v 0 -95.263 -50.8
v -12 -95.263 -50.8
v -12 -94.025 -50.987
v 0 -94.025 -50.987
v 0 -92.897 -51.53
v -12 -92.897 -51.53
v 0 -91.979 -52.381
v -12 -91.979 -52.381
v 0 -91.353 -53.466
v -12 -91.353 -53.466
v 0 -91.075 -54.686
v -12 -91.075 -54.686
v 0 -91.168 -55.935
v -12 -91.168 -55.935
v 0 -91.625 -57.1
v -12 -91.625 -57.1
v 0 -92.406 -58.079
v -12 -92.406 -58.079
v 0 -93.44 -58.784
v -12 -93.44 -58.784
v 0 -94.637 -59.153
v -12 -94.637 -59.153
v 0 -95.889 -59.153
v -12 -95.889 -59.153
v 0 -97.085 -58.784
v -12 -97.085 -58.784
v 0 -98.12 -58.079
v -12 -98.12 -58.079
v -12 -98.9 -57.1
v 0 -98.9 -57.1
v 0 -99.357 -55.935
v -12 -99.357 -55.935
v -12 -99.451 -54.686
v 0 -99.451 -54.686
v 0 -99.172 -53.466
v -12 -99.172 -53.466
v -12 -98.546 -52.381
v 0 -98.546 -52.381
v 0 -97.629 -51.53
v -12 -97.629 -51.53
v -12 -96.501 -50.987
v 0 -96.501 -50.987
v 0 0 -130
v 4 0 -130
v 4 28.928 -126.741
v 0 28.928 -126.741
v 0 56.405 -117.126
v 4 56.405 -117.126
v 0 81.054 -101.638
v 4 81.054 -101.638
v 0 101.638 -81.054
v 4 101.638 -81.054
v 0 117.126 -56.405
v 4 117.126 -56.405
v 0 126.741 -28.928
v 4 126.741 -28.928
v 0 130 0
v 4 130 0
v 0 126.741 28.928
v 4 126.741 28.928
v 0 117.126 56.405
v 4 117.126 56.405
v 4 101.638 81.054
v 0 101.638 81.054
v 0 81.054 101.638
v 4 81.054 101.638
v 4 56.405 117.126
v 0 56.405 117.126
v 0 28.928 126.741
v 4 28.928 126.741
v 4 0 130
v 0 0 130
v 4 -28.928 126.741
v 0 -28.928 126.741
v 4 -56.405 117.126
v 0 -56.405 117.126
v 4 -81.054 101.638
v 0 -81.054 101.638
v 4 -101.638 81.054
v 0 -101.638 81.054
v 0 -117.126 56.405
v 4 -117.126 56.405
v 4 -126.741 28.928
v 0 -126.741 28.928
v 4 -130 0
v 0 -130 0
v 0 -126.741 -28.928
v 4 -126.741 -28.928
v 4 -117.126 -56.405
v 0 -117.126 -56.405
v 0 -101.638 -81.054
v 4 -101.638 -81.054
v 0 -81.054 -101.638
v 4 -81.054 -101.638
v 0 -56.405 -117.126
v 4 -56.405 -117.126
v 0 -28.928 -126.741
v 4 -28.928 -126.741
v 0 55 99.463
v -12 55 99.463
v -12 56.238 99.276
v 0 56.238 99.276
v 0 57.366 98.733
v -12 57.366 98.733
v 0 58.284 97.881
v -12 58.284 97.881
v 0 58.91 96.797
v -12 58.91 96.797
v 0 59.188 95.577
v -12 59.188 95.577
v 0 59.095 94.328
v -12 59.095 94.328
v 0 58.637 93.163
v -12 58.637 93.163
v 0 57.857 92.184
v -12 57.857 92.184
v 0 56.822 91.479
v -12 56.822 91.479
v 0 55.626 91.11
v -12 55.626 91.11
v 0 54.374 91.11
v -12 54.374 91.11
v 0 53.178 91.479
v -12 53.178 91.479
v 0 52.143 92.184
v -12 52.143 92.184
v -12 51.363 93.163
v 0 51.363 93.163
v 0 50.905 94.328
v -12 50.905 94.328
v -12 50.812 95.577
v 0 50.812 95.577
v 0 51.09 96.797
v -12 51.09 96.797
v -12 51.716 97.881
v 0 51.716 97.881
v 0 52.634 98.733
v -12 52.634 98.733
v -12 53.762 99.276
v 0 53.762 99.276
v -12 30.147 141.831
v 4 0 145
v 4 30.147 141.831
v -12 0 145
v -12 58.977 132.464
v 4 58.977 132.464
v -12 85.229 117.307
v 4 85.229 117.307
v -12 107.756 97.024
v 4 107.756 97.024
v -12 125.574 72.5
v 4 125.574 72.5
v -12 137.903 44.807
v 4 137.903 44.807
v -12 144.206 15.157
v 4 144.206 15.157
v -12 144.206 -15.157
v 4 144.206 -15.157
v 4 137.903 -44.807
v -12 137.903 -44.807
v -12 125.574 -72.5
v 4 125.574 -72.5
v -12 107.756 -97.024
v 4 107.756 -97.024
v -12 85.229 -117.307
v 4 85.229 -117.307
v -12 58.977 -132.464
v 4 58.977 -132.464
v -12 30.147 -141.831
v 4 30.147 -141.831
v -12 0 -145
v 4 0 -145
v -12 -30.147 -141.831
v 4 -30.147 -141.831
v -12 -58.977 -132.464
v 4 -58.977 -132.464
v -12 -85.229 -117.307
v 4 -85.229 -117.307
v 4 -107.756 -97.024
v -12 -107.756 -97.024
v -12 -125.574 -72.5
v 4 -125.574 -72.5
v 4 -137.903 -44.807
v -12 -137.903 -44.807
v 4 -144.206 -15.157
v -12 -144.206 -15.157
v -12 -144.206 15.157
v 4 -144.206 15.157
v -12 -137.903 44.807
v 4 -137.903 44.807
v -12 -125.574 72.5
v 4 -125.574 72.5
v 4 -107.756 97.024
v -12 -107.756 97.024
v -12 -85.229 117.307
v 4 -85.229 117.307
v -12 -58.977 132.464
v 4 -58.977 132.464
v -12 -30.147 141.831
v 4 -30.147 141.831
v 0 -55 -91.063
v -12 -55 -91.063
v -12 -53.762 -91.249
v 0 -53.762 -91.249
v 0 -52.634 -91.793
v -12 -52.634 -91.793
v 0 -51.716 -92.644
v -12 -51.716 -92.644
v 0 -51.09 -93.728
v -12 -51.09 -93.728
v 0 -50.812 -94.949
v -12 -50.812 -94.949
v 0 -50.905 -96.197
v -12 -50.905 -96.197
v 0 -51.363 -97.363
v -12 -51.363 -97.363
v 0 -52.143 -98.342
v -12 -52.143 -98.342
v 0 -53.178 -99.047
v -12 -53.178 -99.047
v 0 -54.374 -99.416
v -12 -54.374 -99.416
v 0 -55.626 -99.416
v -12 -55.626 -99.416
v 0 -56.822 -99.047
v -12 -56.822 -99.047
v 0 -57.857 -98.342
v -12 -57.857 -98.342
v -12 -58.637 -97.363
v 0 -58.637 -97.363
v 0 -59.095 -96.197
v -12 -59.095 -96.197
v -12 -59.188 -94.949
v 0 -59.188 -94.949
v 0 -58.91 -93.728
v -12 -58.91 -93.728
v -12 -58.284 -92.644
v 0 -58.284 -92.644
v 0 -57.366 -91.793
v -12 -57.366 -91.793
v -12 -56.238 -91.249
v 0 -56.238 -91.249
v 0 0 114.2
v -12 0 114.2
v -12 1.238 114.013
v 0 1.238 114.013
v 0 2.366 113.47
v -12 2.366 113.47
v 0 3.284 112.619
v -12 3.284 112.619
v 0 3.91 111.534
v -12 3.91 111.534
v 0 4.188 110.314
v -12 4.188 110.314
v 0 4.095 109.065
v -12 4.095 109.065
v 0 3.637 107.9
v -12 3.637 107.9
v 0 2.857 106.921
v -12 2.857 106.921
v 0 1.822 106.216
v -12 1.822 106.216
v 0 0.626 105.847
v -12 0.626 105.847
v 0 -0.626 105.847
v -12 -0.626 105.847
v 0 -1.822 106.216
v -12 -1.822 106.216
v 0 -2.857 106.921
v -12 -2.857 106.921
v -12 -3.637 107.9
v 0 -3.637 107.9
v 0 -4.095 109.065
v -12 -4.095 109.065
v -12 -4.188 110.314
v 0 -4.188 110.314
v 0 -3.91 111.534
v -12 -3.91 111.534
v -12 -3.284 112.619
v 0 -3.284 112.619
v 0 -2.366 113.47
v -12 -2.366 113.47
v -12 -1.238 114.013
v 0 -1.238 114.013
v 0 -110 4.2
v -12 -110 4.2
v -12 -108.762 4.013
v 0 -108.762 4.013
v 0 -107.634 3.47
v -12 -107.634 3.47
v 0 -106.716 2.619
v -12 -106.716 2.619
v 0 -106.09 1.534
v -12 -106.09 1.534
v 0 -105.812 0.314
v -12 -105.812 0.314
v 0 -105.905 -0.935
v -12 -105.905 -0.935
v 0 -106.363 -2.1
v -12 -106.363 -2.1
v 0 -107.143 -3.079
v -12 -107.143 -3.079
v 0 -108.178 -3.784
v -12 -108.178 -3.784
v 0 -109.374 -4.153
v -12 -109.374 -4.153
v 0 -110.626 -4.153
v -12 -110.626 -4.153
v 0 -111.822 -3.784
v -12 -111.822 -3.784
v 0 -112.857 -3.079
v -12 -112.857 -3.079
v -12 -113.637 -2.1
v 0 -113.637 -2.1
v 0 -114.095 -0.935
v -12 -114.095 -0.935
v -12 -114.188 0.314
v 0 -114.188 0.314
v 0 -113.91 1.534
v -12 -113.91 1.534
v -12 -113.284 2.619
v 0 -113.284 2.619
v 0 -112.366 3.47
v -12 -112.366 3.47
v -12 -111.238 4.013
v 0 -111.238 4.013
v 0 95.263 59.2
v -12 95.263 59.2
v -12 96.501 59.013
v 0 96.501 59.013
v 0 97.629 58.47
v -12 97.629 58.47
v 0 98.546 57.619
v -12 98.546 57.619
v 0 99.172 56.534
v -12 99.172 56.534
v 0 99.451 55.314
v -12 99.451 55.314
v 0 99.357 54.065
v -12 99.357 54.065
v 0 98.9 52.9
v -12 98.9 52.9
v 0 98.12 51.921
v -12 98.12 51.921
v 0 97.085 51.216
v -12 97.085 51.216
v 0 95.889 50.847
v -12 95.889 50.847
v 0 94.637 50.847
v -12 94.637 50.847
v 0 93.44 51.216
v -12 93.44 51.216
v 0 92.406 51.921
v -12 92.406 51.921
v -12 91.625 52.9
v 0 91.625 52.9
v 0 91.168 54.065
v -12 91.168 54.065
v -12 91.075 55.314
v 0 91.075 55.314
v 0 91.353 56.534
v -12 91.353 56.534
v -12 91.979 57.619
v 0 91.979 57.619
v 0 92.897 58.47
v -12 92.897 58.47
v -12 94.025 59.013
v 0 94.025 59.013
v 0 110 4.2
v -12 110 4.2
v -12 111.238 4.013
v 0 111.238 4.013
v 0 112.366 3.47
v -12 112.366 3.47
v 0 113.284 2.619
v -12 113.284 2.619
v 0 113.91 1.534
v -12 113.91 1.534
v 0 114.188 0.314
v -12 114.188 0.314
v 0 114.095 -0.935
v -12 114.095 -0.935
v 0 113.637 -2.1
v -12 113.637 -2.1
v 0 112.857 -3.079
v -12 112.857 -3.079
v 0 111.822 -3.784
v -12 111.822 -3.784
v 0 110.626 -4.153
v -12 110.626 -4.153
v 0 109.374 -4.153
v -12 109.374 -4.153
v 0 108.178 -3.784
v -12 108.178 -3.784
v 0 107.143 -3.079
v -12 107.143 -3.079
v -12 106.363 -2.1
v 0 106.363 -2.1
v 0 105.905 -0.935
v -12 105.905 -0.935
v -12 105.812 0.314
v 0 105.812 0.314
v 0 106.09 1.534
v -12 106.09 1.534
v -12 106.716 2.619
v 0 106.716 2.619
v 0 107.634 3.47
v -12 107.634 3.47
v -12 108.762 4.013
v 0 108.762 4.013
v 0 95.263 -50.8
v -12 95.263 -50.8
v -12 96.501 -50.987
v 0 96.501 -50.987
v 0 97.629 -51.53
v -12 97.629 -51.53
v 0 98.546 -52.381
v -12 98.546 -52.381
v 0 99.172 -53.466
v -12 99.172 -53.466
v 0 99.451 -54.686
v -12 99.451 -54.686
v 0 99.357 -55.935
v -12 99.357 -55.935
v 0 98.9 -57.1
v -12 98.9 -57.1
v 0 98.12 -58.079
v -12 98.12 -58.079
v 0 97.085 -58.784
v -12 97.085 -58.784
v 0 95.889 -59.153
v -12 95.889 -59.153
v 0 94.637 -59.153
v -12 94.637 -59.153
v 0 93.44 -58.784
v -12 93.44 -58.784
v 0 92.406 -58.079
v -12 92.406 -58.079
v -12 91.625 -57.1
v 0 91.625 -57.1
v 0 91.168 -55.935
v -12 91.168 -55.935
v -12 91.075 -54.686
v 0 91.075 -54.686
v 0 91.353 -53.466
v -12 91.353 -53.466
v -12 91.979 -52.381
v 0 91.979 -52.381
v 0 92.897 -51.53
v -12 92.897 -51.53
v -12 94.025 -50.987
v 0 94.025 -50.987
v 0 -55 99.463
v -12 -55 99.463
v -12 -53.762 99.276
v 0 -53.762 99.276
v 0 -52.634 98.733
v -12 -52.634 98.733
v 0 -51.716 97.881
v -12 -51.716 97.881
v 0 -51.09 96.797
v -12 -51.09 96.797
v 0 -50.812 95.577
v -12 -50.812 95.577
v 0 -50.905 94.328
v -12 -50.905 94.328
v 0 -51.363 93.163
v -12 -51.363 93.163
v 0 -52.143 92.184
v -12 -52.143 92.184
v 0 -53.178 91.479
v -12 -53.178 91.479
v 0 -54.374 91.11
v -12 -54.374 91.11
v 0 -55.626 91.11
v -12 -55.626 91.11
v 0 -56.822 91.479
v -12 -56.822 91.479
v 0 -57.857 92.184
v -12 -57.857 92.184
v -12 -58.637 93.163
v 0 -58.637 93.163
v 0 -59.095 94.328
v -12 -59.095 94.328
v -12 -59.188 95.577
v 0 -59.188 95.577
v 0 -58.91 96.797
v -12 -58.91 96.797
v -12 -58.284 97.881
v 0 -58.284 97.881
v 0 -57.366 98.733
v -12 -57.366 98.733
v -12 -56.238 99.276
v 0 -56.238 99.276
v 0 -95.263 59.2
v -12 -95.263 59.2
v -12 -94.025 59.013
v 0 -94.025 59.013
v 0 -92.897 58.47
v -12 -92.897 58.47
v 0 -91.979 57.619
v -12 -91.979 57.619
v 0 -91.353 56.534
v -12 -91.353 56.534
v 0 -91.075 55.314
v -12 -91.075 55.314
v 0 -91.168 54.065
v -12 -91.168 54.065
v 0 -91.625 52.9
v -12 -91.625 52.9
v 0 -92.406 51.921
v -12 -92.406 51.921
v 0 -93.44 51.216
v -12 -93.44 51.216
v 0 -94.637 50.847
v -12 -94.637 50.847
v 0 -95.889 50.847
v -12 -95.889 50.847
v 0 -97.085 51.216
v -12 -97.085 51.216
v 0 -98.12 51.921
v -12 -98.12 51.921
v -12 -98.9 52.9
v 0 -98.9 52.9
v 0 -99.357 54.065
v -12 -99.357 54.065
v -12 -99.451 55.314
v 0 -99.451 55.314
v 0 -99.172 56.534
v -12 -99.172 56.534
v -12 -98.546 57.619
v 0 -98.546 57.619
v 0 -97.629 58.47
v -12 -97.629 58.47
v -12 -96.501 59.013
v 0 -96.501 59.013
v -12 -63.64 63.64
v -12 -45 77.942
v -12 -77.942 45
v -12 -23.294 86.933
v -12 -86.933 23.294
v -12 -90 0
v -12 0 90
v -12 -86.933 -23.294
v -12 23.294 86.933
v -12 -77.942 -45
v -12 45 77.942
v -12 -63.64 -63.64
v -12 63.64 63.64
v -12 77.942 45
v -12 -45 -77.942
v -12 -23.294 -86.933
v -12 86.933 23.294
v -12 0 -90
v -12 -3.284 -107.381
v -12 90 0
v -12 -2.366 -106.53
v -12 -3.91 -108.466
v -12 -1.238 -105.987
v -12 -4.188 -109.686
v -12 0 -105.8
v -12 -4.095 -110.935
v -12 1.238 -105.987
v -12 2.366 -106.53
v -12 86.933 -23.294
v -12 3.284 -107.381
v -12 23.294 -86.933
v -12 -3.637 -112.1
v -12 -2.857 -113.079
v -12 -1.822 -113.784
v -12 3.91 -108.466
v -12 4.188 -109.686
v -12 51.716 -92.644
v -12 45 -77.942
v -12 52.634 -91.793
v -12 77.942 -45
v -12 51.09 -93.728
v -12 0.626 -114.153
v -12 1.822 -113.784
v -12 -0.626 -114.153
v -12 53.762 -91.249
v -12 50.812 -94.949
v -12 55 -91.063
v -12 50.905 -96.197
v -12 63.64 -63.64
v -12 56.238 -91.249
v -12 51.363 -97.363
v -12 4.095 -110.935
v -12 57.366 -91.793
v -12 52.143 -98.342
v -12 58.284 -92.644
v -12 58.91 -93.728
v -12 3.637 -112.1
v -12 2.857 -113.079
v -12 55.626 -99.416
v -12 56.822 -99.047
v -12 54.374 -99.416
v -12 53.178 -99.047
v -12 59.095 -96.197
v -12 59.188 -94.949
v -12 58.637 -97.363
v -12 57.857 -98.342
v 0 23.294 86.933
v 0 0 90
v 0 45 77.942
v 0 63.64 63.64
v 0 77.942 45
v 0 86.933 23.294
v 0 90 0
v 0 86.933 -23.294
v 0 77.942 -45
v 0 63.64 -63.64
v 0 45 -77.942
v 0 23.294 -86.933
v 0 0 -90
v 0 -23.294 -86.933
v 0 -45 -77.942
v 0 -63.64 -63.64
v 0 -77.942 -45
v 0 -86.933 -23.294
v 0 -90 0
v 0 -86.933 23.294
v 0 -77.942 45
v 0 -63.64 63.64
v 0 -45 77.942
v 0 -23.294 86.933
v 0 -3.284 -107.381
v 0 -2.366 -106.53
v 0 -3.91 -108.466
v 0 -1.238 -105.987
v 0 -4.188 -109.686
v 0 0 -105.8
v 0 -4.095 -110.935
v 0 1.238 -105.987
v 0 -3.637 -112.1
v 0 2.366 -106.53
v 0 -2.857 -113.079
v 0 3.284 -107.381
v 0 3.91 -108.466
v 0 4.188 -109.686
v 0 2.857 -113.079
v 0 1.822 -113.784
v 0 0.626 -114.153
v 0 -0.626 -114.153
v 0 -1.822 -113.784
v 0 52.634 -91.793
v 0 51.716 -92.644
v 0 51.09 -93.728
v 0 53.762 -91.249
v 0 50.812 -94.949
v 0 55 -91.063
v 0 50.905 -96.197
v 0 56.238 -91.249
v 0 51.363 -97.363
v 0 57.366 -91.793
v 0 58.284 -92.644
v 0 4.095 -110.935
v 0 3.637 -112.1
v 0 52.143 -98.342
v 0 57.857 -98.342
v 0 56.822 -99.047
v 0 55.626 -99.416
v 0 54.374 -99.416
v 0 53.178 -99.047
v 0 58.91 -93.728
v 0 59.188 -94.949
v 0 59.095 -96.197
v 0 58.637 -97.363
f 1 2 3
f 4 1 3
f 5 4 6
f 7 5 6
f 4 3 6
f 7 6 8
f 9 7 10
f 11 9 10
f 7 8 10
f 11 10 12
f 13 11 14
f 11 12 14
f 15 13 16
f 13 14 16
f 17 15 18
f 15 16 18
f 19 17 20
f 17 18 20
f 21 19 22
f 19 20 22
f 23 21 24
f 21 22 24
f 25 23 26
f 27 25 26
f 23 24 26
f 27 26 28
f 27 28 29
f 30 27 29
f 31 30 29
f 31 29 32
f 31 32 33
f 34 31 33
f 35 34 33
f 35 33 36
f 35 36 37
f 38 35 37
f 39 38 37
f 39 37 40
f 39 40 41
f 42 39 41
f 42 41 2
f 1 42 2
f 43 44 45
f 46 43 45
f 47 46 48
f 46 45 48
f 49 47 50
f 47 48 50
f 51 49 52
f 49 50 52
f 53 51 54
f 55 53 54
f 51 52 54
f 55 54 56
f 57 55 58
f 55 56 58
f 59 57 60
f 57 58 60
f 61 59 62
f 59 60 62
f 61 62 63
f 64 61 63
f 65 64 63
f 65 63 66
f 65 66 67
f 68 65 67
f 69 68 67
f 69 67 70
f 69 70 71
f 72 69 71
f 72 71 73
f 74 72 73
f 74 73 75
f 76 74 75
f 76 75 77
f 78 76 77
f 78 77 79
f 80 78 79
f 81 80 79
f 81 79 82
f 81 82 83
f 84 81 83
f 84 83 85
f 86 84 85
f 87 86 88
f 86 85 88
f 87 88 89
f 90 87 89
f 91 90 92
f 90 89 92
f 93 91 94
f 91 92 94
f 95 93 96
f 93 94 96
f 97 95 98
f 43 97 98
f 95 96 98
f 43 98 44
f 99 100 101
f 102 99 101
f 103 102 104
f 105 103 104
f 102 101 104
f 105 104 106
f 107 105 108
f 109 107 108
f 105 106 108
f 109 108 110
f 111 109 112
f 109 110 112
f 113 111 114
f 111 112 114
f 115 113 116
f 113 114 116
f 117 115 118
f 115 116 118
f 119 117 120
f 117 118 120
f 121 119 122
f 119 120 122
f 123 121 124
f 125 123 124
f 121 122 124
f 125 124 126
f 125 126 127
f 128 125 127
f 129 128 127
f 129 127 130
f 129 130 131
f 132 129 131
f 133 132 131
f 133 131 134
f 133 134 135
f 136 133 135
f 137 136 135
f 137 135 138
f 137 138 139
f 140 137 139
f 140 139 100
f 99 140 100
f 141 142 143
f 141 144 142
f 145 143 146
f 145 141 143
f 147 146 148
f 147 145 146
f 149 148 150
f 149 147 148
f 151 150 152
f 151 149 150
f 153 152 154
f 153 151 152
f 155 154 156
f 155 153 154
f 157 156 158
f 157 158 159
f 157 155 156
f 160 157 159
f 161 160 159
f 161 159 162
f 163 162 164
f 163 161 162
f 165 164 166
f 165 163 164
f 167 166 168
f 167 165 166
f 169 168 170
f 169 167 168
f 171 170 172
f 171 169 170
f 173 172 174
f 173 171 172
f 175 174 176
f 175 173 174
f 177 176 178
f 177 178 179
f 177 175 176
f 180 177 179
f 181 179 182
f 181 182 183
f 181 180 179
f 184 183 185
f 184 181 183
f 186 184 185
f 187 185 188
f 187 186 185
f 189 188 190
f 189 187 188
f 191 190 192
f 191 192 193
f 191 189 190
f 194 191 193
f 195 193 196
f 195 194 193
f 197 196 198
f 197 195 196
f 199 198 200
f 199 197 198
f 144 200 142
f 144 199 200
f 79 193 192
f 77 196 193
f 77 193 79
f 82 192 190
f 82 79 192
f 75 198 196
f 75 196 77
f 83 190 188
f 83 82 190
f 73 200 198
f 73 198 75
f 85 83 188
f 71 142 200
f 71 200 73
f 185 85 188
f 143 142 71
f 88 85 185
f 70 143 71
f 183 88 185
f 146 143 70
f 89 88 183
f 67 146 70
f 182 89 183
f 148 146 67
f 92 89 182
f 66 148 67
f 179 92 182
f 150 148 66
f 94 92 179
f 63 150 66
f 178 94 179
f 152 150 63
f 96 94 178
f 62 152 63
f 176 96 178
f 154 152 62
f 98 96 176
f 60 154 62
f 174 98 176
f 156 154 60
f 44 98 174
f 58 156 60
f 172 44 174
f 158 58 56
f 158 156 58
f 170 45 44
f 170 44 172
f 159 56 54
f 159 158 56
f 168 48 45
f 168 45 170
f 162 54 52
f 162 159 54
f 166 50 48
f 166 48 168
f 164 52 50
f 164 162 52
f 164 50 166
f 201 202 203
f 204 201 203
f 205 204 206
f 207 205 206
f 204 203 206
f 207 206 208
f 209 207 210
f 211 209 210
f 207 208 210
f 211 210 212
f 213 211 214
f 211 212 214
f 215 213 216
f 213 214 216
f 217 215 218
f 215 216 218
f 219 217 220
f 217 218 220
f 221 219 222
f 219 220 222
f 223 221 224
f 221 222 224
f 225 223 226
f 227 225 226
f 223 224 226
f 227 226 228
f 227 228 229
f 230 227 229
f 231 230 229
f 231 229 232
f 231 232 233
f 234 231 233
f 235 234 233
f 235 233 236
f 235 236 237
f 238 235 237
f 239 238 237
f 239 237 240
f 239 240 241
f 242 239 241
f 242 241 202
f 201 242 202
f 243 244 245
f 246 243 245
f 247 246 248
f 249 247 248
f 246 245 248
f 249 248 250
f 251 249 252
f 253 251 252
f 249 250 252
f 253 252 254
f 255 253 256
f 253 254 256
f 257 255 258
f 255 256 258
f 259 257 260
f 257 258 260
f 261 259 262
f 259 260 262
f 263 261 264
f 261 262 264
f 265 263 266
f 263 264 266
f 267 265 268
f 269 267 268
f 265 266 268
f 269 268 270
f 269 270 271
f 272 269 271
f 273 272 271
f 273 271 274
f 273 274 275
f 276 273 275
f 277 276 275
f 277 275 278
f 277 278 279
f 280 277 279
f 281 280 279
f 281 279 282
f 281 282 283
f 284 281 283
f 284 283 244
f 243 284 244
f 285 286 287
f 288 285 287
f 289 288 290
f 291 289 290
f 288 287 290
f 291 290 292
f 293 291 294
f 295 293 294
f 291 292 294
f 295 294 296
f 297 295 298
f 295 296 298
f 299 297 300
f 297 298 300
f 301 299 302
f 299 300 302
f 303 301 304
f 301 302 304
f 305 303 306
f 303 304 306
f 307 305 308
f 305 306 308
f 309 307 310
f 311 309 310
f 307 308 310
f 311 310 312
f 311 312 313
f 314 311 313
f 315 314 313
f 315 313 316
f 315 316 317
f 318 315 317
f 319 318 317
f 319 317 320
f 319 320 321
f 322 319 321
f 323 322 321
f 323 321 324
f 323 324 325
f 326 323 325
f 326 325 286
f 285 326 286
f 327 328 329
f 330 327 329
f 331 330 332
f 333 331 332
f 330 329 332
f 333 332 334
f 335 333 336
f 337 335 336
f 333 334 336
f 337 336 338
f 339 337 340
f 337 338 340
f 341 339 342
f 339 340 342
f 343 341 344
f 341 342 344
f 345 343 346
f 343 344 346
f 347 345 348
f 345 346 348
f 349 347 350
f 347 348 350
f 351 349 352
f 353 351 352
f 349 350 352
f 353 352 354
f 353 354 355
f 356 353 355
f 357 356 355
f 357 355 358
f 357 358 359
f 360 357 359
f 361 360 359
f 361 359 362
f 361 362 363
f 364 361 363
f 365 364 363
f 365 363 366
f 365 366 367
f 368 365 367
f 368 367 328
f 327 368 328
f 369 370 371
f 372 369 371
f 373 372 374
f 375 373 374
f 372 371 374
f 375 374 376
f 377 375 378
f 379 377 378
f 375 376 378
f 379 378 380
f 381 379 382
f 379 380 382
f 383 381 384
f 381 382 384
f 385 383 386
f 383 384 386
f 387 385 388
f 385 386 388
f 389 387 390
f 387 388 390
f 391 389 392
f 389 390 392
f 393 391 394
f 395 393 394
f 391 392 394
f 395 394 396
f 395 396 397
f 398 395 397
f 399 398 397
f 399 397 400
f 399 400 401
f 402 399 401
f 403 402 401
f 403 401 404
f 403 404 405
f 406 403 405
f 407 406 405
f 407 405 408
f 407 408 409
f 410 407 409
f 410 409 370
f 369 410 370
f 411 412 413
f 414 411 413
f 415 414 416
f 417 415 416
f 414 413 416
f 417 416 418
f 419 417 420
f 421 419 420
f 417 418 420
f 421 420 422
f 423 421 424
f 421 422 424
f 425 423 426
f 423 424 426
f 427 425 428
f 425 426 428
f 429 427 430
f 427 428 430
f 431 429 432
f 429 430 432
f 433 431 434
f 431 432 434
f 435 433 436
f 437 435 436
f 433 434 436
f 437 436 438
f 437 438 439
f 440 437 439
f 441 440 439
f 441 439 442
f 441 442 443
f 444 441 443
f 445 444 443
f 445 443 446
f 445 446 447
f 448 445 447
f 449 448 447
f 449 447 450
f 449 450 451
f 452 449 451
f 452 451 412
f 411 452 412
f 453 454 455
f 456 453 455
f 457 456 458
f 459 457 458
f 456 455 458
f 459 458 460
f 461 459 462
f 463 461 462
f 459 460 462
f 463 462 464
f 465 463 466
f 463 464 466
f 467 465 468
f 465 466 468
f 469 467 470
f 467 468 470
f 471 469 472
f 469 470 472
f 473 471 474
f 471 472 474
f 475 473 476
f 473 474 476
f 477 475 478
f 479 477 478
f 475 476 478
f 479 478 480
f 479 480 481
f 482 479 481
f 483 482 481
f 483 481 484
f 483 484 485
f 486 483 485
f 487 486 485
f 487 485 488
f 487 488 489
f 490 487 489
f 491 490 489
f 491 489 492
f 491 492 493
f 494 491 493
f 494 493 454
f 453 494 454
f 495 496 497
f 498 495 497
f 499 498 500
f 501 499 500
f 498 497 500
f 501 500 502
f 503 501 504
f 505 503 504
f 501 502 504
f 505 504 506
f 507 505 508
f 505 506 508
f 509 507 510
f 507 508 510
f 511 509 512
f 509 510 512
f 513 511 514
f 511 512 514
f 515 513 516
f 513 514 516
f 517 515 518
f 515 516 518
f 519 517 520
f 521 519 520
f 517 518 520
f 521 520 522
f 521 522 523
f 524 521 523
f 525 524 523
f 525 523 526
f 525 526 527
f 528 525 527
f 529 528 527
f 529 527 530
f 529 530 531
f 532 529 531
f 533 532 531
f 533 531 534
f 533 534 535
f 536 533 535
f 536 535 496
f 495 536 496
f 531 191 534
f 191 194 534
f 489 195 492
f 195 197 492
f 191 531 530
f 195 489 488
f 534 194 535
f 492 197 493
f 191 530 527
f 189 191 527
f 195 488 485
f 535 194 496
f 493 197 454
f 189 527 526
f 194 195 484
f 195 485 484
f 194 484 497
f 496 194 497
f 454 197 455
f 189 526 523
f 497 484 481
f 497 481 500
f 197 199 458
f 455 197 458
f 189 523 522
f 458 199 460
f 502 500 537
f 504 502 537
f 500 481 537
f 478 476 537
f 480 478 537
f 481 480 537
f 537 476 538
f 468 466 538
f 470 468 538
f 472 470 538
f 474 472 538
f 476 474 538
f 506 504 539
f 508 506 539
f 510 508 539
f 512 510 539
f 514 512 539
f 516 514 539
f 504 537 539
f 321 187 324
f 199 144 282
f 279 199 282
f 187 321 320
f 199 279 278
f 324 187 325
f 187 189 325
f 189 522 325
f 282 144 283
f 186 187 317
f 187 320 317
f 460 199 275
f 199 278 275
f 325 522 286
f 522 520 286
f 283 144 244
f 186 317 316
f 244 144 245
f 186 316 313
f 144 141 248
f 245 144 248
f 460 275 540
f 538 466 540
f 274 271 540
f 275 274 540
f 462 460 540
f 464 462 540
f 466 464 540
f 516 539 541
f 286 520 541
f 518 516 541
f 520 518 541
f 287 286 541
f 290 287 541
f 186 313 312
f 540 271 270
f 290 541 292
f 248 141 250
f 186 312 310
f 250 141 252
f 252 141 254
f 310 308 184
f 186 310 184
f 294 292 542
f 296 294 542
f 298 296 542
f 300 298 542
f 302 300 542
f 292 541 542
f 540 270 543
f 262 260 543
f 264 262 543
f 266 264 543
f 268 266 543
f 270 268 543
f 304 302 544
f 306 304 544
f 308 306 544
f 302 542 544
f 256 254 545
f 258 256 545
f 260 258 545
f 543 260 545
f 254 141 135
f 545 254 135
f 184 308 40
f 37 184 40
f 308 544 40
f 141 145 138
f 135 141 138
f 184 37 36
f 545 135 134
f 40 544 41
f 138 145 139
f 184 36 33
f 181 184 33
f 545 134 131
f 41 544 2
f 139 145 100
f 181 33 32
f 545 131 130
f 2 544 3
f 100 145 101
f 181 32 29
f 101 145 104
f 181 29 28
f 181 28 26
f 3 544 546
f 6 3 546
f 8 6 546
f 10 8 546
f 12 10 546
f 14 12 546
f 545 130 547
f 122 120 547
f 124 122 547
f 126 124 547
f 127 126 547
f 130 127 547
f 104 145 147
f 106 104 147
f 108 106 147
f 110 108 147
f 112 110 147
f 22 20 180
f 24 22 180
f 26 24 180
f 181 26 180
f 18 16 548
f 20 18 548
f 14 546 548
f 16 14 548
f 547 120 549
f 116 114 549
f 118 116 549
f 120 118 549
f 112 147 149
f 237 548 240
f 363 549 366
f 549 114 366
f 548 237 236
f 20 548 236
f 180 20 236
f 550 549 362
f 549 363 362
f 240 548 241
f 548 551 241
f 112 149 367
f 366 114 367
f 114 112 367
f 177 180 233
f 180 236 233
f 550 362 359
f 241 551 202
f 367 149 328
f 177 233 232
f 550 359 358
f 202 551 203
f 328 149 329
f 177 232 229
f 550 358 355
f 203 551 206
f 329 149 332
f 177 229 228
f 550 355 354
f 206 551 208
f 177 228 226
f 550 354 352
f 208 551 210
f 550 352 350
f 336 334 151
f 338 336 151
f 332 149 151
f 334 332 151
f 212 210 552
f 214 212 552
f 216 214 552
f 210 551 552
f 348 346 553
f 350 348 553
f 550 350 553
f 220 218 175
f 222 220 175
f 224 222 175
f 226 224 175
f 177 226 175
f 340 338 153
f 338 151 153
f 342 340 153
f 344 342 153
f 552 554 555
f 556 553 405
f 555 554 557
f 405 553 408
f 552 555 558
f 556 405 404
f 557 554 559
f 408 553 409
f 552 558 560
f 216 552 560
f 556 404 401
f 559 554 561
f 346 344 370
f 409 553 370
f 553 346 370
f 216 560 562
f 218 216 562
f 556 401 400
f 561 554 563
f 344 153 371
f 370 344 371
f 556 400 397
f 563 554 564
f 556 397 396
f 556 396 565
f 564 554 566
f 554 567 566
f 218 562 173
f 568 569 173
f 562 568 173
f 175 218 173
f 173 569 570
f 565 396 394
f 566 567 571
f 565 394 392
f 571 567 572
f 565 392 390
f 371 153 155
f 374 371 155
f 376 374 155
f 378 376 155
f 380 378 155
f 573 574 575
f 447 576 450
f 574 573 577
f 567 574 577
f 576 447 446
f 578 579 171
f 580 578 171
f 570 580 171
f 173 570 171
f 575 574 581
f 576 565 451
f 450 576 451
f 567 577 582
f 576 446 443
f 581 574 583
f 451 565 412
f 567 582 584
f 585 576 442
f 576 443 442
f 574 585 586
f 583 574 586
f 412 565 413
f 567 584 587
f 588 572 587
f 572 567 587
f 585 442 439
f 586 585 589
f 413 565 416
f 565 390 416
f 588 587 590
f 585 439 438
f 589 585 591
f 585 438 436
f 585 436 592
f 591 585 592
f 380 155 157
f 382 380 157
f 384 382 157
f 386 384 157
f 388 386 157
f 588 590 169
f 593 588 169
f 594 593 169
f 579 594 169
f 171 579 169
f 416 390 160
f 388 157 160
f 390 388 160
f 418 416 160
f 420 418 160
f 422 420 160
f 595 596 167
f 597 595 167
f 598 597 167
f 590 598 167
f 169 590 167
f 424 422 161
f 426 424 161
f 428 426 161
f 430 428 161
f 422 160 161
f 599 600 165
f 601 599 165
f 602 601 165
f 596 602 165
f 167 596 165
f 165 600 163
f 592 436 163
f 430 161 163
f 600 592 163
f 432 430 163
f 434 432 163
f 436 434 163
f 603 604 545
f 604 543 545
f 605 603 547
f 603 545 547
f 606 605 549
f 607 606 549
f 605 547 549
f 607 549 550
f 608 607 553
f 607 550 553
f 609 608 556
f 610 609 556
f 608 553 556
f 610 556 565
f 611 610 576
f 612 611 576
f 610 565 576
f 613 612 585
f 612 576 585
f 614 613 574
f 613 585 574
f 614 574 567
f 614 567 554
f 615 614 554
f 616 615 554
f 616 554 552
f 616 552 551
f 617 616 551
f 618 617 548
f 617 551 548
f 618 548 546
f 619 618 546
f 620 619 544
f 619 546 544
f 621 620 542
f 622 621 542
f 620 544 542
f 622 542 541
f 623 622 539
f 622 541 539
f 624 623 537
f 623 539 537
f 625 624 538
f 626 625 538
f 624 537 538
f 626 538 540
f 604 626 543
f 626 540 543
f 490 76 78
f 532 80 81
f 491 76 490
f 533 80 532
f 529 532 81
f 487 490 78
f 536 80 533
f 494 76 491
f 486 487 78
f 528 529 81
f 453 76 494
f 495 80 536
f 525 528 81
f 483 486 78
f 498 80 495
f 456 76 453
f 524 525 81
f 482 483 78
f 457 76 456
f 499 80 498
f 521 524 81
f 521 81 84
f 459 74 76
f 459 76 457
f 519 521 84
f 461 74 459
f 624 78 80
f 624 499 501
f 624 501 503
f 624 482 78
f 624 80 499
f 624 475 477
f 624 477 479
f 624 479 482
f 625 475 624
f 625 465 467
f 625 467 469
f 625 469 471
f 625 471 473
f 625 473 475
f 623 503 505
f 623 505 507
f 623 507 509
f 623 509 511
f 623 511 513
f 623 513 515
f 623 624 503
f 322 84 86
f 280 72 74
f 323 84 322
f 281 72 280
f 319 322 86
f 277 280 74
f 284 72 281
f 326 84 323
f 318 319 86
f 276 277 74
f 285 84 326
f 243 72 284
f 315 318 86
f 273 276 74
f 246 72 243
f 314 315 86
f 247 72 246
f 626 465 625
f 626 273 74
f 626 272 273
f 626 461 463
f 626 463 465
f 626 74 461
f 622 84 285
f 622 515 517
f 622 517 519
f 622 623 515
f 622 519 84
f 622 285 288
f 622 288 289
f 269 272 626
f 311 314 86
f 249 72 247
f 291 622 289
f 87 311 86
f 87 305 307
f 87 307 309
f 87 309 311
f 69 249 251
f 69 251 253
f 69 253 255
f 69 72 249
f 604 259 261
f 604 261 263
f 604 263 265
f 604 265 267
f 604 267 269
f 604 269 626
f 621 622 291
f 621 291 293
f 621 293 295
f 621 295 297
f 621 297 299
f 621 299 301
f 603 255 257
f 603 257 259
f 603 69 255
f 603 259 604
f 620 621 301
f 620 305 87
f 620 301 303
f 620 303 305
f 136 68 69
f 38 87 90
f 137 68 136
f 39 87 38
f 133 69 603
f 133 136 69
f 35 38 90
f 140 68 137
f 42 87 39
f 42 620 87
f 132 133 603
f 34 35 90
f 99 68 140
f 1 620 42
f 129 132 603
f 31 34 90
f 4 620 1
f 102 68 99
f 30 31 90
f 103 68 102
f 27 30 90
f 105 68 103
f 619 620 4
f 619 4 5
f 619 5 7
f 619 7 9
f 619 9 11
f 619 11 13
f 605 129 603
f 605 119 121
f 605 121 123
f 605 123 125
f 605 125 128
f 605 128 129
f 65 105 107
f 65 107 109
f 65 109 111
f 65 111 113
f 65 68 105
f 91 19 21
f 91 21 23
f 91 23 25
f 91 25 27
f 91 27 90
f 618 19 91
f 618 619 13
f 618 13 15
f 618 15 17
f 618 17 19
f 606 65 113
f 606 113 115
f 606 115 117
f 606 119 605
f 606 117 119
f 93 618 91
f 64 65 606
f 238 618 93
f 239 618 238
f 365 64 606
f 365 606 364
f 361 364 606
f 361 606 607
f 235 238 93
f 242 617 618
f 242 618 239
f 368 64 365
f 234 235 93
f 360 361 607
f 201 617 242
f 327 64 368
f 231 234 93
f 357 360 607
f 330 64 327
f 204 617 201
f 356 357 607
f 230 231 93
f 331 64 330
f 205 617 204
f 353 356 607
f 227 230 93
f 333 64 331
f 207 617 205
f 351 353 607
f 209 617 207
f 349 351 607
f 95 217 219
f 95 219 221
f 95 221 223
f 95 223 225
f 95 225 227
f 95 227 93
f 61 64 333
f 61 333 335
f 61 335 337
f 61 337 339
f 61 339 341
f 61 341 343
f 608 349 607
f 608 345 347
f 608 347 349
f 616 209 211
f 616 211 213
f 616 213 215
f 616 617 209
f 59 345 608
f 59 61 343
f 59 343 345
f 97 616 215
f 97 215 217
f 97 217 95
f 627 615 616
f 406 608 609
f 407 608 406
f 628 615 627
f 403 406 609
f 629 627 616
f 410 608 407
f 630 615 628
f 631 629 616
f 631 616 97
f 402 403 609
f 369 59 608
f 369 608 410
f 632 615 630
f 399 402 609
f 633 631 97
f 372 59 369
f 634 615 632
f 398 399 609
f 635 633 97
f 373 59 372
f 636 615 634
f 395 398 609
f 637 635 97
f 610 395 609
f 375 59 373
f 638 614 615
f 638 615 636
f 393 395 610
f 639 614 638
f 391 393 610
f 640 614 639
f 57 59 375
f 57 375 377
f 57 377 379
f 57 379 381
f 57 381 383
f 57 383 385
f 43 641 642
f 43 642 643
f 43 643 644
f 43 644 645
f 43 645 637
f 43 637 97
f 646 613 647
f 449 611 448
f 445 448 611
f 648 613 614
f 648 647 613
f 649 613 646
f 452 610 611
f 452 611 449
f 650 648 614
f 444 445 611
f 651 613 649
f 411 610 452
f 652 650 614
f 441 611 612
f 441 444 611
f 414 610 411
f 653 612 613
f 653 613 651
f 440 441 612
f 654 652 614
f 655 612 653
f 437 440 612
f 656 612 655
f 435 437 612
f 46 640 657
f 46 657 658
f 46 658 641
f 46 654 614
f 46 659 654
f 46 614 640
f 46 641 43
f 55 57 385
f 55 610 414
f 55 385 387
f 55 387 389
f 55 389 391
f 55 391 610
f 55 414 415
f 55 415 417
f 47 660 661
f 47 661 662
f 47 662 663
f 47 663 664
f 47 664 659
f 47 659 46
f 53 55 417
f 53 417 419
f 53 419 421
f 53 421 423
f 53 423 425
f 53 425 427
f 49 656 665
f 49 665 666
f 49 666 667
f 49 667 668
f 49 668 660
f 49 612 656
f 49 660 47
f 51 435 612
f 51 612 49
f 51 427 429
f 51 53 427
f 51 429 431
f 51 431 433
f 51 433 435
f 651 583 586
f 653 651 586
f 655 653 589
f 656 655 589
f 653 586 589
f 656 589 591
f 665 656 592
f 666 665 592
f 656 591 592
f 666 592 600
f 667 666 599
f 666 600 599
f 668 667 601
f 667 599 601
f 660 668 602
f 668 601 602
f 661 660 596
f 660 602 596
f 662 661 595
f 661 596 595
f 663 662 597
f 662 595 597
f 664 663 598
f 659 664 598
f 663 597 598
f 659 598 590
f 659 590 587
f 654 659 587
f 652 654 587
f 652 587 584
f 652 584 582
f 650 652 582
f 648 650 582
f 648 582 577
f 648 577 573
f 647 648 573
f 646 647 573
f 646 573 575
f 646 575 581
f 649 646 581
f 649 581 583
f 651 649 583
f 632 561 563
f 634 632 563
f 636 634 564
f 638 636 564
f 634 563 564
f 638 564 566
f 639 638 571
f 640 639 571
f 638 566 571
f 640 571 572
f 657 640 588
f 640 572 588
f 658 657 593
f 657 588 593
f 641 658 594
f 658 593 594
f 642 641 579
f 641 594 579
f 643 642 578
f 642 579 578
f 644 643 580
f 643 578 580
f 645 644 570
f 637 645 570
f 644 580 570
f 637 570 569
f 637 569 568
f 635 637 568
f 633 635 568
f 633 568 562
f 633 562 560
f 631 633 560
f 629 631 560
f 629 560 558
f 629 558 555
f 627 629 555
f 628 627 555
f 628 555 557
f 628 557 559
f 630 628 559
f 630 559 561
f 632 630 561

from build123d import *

# Parameters (mm, degrees)
SKETCH1_W                  = 16
SKETCH1_H                  = 145
HOLE1_D                    = 180
HOLE1_CBORE_D              = 260
HOLE1_CBORE_DEPTH          = 4
F_8_4_8_4_DIAMETER_HOLE1_D = 8.4


with BuildPart() as part:
    # Sketch1 → Revolve1 (revolve)
    with BuildSketch(Plane(origin=(0, 0, 0), x_dir=(-1, 0, 0), z_dir=(0, 0, -1)), mode=Mode.PRIVATE) as revolve1_sk:
        with Locations((4, 72.5)):
            Rectangle(SKETCH1_W, SKETCH1_H)
    revolve(revolve1_sk.sketch.rotate(Axis((4, 0, 0), (-1, 0, 0)), 270), axis=Axis((4, 0, 0), (-1, 0, 0)))

    # Hole1 (through all)
    with Locations(Plane(origin=(4, 0, 0), x_dir=(0, 0, -1), z_dir=(1, 0, 0))):
        with Locations((0, 0)):
            CounterBoreHole(HOLE1_D / 2, HOLE1_CBORE_D / 2, HOLE1_CBORE_DEPTH)

    # Ø8.4 (8.4) Diameter Hole1 (through all)
    with Locations(Plane(origin=(0, 0, 0), x_dir=(0, 0, -1), z_dir=(1, 0, 0))):
        with Locations((110, 0), (95.262794416, 55), (55, 95.262794416), (0, 110), (-55, 95.262794416), (-95.262794416, 55), (-110, 0), (-95.262794416, -55), (-55, -95.262794416), (0, -110), (55, -95.262794416), (95.262794416, -55)):
            Hole(F_8_4_8_4_DIAMETER_HOLE1_D / 2)


solid = part.part
